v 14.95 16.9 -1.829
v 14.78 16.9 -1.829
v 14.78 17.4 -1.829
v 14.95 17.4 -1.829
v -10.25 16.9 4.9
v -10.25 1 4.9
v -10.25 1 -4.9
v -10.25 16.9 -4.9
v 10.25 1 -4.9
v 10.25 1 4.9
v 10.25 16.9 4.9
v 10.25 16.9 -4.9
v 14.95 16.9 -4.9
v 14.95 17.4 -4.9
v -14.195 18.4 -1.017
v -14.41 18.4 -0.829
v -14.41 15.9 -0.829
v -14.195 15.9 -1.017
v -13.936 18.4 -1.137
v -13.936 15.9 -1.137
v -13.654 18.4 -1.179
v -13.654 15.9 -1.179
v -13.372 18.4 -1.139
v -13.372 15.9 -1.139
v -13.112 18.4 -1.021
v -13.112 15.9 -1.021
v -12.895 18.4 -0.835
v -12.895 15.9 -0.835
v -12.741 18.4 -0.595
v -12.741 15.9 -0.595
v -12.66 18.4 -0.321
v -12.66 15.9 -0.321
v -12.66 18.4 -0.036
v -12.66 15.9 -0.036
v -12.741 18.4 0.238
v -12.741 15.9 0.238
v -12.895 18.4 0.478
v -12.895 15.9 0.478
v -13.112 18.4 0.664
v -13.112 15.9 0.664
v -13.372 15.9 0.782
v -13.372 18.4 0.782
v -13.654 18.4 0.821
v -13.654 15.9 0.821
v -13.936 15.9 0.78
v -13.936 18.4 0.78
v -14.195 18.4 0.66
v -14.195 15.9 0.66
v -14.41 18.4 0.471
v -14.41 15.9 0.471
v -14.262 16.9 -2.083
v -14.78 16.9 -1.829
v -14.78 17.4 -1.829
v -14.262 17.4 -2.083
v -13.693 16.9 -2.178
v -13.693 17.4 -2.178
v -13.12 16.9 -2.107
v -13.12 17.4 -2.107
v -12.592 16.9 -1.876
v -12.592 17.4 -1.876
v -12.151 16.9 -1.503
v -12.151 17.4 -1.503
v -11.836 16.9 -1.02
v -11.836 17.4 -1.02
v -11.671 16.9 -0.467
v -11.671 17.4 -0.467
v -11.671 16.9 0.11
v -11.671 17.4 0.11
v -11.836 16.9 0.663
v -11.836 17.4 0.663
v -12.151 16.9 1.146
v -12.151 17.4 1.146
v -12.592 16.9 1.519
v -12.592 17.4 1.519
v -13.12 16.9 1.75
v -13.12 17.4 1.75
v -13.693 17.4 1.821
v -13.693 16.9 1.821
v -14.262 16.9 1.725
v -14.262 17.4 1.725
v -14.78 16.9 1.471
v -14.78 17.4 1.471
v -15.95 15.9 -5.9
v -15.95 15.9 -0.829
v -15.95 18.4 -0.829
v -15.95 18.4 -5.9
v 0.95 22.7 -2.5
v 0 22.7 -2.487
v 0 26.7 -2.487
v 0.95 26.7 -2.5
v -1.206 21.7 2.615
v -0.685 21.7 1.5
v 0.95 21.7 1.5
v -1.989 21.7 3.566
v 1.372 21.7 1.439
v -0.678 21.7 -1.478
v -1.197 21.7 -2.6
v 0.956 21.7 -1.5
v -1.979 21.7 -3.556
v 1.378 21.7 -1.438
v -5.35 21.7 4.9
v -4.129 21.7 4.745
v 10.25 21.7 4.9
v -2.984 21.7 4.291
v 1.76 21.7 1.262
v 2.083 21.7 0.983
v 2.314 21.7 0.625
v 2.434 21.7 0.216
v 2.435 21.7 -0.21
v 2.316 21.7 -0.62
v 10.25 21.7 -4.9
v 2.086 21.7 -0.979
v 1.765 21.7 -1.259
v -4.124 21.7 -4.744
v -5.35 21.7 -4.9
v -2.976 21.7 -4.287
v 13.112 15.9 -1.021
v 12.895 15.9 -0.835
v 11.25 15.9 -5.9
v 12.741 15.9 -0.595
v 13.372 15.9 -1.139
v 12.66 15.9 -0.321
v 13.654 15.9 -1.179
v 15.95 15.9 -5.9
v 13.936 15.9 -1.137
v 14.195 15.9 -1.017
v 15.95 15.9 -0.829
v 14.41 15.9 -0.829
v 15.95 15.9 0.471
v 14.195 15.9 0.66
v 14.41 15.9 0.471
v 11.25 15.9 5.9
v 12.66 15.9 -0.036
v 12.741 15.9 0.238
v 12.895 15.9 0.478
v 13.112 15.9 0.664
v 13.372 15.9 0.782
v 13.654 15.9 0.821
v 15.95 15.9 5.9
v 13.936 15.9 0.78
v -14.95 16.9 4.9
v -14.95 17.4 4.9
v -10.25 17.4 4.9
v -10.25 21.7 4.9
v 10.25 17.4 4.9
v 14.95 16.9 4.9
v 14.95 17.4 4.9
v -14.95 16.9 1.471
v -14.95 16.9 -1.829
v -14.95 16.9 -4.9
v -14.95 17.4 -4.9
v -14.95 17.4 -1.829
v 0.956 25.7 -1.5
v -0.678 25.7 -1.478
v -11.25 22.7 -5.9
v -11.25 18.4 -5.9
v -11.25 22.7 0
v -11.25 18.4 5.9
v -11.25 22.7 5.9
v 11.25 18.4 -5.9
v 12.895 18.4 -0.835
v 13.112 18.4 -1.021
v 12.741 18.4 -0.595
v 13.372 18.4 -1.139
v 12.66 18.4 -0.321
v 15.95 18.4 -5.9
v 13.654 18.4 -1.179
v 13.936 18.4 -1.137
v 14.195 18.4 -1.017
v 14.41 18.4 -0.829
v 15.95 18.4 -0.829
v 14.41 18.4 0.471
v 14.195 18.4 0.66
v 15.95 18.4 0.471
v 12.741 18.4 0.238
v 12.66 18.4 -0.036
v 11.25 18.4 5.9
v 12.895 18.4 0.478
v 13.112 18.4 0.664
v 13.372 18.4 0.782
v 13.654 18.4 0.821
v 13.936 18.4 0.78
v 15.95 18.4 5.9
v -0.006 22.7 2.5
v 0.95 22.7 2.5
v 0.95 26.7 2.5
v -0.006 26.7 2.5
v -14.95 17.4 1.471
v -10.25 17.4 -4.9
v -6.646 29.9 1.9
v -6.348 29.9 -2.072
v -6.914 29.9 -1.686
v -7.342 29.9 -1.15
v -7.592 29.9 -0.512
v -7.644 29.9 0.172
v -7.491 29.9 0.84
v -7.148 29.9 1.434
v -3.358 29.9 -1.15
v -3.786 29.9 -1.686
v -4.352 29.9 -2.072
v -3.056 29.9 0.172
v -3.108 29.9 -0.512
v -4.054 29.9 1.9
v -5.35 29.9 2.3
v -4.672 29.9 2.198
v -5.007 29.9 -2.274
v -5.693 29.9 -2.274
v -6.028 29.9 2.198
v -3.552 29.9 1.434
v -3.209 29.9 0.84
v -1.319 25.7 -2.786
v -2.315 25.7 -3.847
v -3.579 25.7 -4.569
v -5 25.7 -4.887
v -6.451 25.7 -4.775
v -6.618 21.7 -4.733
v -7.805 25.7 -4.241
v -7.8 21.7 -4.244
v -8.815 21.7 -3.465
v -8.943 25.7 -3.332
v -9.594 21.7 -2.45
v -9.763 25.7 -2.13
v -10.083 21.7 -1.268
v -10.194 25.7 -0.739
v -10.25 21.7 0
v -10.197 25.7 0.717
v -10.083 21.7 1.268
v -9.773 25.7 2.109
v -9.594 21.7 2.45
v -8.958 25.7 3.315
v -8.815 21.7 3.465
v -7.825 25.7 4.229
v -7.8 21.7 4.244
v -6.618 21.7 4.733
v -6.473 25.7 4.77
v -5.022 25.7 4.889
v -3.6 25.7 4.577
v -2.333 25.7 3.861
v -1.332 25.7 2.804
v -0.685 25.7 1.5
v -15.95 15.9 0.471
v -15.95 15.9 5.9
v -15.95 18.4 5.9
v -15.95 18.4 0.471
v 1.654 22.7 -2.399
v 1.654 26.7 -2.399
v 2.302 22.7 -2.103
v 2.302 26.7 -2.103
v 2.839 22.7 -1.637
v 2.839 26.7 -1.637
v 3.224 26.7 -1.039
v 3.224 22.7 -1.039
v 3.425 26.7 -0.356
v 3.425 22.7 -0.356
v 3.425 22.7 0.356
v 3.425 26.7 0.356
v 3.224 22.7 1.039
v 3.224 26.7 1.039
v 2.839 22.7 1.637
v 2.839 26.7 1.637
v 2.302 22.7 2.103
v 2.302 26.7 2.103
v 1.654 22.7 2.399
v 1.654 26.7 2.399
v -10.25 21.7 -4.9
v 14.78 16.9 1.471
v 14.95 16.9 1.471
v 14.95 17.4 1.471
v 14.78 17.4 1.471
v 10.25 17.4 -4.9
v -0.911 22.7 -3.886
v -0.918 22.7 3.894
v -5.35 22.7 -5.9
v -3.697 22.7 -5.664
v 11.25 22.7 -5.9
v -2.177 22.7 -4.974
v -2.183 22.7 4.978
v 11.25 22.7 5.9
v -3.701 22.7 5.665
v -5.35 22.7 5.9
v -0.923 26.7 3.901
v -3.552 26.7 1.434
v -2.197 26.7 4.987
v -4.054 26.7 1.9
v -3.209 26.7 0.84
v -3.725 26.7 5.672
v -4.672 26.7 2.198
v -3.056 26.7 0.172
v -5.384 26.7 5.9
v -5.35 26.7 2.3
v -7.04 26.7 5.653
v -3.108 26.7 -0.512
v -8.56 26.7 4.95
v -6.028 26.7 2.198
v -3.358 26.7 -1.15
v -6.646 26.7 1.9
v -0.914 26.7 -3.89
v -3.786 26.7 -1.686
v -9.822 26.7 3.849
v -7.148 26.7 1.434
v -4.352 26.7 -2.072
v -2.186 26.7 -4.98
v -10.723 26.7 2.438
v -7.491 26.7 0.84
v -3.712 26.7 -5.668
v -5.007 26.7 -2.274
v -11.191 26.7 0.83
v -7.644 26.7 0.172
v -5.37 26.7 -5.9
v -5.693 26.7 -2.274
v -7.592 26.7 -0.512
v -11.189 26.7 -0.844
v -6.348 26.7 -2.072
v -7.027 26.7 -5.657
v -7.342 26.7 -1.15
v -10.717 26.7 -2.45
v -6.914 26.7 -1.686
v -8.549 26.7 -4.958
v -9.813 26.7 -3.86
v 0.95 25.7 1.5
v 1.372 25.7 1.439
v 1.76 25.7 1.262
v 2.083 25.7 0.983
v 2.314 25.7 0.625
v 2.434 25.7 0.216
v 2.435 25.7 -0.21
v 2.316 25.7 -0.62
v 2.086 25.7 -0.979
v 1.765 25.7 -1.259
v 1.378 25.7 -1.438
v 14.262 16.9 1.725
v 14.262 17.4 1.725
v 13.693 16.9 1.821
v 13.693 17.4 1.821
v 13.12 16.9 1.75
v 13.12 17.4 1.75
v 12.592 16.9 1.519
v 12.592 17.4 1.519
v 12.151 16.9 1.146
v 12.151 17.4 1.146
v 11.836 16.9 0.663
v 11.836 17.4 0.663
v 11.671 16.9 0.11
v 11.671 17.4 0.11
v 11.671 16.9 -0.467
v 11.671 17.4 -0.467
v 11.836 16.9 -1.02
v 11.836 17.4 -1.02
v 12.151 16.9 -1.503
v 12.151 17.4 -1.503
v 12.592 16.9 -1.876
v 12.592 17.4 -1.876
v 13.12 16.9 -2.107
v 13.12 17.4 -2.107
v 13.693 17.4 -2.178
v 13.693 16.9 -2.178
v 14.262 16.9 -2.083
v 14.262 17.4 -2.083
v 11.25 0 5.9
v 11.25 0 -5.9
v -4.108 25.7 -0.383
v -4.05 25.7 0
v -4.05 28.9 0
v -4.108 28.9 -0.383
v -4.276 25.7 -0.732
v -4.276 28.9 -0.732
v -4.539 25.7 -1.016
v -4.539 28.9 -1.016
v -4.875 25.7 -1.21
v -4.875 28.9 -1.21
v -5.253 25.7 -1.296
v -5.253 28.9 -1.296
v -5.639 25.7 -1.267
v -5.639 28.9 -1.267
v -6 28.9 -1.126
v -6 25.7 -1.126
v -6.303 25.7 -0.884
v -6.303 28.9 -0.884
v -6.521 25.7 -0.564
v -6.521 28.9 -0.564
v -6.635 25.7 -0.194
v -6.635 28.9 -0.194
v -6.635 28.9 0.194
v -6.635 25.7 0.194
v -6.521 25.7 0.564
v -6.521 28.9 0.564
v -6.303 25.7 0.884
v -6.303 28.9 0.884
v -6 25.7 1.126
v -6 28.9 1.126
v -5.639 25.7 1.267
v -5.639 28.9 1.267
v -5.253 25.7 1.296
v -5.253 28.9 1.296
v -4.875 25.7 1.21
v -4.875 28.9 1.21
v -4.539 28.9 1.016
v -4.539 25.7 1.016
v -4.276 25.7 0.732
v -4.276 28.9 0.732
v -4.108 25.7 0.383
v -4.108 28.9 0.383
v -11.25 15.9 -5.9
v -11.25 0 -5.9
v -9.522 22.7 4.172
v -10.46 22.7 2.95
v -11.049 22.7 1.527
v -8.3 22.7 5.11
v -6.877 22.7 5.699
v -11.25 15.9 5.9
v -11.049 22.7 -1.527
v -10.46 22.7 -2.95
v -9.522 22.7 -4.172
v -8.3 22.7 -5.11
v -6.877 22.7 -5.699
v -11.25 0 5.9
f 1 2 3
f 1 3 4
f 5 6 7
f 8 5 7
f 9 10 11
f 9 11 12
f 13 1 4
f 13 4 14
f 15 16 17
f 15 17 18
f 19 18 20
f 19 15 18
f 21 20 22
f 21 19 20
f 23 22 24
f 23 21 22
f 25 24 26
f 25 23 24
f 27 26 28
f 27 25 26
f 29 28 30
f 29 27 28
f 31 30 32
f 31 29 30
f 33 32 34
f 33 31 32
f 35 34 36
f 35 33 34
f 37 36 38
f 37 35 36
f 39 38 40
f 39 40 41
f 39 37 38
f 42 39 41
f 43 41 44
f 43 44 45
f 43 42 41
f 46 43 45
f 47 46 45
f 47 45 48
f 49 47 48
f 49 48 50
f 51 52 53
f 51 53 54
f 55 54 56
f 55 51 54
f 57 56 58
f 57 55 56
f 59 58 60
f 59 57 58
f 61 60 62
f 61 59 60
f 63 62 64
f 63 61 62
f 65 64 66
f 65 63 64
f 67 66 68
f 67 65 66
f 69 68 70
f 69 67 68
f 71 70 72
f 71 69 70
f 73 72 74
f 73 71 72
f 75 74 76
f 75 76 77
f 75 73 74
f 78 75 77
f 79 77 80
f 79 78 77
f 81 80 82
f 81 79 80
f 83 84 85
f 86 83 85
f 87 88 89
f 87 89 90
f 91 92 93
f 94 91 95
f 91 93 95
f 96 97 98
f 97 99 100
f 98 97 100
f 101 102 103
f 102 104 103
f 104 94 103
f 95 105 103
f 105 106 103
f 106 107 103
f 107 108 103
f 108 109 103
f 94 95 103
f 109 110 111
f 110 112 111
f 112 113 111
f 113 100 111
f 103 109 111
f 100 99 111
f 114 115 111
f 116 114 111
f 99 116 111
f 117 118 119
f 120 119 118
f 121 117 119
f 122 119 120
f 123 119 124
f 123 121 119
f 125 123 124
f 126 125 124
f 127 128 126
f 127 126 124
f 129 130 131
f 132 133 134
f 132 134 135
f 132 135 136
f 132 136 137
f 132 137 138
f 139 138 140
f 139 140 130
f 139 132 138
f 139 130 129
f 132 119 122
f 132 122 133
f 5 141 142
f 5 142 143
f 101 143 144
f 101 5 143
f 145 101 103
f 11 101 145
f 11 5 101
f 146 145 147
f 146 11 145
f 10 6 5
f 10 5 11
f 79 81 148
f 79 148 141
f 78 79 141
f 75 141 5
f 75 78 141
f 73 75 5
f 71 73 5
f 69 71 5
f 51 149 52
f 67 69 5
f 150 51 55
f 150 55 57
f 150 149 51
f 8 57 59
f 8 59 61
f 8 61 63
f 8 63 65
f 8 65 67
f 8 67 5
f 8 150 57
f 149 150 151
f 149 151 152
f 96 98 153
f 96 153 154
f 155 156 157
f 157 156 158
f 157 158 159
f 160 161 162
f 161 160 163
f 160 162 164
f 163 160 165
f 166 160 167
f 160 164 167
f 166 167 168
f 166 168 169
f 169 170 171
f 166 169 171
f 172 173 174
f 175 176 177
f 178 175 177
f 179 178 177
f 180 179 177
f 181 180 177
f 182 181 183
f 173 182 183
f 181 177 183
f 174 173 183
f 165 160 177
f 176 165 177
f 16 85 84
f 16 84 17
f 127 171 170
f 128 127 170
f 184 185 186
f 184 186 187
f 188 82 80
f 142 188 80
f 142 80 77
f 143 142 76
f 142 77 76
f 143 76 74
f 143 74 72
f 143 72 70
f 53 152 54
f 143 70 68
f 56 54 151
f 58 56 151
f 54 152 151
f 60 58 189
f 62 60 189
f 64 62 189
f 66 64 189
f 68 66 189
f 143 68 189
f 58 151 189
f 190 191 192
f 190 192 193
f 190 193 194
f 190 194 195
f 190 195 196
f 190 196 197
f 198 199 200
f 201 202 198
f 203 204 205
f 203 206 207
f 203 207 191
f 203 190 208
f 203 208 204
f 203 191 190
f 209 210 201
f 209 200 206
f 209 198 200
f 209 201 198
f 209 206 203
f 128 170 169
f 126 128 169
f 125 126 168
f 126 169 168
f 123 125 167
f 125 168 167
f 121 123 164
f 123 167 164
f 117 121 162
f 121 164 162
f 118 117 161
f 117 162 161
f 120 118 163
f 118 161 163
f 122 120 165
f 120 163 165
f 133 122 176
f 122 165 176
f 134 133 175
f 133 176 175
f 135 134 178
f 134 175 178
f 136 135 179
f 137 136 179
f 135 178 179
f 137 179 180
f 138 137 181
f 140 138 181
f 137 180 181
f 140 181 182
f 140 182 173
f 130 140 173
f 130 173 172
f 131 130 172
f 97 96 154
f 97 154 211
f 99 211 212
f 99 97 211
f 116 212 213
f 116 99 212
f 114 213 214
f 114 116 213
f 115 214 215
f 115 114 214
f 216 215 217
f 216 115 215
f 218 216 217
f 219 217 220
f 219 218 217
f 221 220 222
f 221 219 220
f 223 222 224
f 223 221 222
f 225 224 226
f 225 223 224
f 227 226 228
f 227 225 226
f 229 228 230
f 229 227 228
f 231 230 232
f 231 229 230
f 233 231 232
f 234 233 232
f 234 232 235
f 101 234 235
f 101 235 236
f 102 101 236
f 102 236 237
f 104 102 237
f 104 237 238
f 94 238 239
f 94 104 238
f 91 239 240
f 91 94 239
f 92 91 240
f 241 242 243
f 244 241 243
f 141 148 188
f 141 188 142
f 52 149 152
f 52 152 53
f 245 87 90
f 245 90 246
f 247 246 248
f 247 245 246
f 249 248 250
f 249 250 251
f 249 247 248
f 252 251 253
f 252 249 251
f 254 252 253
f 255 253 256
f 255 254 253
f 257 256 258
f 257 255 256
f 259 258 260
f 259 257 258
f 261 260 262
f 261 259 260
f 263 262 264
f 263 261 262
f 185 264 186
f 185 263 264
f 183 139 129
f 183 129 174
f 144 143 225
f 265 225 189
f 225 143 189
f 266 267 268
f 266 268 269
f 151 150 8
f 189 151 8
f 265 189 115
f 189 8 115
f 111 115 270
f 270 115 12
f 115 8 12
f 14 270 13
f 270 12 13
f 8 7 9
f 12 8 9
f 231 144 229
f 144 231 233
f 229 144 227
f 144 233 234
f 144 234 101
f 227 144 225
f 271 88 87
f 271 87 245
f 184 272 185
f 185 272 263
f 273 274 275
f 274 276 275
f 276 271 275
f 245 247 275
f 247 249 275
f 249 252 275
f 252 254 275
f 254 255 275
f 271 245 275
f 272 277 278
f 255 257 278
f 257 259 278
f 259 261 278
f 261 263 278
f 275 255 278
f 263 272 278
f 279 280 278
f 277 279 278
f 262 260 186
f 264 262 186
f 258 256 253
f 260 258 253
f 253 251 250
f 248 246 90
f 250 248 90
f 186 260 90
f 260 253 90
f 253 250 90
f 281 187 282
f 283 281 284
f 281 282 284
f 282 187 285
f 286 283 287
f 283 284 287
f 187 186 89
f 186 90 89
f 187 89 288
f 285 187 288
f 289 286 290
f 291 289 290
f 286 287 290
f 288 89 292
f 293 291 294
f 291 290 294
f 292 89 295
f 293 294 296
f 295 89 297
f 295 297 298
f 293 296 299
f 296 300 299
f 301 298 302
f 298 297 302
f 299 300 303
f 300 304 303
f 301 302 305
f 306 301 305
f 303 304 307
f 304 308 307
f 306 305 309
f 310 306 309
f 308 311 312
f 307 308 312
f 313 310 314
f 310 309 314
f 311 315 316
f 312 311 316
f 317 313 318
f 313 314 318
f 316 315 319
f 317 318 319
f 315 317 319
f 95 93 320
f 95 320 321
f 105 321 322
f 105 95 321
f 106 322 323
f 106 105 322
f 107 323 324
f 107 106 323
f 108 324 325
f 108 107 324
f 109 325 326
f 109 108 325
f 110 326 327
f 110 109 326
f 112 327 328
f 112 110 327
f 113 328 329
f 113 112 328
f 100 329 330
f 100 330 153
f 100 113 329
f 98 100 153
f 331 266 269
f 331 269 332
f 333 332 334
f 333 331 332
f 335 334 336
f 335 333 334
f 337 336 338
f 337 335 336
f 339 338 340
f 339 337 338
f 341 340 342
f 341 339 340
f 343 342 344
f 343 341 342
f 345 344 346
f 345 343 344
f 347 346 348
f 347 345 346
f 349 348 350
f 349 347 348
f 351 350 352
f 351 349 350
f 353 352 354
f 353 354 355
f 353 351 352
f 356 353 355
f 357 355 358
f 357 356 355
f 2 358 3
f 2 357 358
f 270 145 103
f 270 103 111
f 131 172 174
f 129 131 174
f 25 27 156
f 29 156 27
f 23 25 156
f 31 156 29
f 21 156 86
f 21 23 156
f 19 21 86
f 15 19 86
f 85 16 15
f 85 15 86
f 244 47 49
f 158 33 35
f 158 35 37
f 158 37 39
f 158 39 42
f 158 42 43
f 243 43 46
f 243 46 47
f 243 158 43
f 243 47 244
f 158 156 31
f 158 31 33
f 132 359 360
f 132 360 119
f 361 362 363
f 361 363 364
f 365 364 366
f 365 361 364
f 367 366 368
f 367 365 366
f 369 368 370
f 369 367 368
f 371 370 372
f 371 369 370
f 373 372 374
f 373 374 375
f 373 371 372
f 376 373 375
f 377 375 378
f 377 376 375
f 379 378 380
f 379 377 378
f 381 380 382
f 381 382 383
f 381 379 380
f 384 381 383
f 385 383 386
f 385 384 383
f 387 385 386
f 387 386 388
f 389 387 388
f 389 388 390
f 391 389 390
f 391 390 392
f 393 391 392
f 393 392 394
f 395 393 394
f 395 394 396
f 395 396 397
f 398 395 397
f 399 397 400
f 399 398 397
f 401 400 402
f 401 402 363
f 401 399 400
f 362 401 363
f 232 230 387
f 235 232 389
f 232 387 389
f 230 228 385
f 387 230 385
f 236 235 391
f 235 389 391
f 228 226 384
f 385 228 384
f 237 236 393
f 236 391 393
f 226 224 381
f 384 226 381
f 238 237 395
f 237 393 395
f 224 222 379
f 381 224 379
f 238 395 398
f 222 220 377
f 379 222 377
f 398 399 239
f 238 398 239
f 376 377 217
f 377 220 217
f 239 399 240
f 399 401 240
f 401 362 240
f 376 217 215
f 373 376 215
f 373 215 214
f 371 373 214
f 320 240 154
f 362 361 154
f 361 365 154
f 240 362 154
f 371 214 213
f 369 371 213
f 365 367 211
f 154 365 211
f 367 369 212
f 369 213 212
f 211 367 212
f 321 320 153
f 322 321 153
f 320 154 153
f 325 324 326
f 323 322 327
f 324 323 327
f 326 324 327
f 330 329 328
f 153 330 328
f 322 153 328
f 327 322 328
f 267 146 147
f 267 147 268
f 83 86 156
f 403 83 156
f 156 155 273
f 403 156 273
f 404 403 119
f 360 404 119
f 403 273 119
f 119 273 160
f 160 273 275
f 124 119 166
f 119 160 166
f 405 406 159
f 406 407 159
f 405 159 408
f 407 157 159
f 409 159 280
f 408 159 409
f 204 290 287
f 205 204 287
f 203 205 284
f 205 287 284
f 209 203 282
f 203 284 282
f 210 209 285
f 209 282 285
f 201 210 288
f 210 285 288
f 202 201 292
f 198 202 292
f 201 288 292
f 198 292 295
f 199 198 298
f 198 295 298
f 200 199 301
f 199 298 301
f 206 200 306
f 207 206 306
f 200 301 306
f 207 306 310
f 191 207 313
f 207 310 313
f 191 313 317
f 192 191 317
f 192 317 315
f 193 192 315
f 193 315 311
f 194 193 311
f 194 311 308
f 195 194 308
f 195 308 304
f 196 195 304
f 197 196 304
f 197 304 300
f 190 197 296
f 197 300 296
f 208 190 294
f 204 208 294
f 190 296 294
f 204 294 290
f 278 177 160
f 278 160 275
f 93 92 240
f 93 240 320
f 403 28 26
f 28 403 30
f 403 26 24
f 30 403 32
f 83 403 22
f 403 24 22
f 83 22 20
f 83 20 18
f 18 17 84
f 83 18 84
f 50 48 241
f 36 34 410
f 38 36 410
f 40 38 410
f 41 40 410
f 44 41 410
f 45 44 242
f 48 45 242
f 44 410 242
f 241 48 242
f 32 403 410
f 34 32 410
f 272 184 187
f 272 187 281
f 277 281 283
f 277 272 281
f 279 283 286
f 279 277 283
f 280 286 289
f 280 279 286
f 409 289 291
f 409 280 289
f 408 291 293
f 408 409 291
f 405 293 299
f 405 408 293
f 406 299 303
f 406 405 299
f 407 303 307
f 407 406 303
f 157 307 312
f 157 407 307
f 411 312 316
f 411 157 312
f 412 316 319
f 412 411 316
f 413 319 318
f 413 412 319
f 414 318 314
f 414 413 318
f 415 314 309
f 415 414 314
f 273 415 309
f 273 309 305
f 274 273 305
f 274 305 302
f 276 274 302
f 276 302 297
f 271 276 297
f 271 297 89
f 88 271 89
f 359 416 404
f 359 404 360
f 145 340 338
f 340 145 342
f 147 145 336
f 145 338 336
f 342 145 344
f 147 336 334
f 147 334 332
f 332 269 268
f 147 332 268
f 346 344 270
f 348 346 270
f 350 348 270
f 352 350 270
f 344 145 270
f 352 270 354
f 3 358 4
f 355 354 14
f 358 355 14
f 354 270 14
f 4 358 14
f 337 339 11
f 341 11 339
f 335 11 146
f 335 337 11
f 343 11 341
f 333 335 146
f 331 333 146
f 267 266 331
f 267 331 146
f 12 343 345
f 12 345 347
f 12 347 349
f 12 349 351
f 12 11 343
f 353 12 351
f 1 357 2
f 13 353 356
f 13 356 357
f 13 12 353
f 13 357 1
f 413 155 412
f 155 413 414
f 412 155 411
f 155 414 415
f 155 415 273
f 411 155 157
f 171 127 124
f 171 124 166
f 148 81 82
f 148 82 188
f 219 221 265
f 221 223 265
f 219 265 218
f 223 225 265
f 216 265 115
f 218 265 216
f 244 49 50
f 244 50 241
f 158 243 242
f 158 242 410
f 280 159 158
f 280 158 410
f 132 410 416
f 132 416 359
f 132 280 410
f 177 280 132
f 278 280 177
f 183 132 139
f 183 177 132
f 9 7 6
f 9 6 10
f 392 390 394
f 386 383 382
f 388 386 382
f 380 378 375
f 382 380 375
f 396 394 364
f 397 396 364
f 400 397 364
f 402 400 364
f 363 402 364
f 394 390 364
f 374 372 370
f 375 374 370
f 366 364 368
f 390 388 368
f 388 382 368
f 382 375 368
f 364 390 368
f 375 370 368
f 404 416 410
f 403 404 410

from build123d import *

# Parameters (mm, degrees)
SKETCH1_W           = 22.5
SKETCH1_H           = 22.7
BOSS_EXTRUDE1_DEPTH = 5.9
SKETCH2_W           = 4.7
SKETCH2_H           = 2.5
BOSS_EXTRUDE2_DEPTH = 11.8
CUT_EXTRUDE1_REACH  = 27.055
BOSS_EXTRUDE3_DEPTH = 4
SKETCH5_R           = 2.3
BOSS_EXTRUDE4_DEPTH = 3.2
SHELL3_START        = 1
SHELL3_OUTLINE_W    = 20.5
SHELL3_OUTLINE_H    = 9.8
SHELL3_DEPTH        = 20.7
SHELL3_START_2      = 21.7
SHELL3_2_DEPTH      = 4
SHELL3_START_3      = 16.9
SHELL3_3_DEPTH      = 0.5
SHELL3_START_4      = 25.7
SHELL3_4_OUTLINE_R  = 1.3
SHELL3_4_DEPTH      = 3.2


# Read off the part's stored shape, not the designer's step: Shell3
with BuildPart() as part:
    # Sketch1 → Boss-Extrude1 (new, symmetric)
    with BuildSketch(Plane.XY):
        with Locations((0, 11.35)):
            Rectangle(SKETCH1_W, SKETCH1_H)
    extrude(amount=BOSS_EXTRUDE1_DEPTH, both=True)

    # Sketch2 → Boss-Extrude2 (add)
    with BuildSketch(Plane.XY.offset(5.9)):
        with Locations((13.6, 17.15)):
            Rectangle(SKETCH2_W, SKETCH2_H)
    boss_extrude2 = extrude(amount=-BOSS_EXTRUDE2_DEPTH)

    # Sketch3 → Cut-Extrude1 (cut, up to next)
    with BuildSketch(Plane(origin=(0, 18.4, 0), x_dir=(1, 0, 0), z_dir=(0, 1, 0)), mode=Mode.PRIVATE) as cut_extrude1_sk1:
        with BuildLine():
            Line((15.95, 0.828555983), (14.409934208, 0.828555983))
            ThreePointArc((14.409934208, 0.828555983), (12.65, 0.178555983), (14.409934208, -0.471444017))
            Line((14.409934208, -0.471444017), (15.95, -0.471444017))
            Line((15.95, -0.471444017), (15.95, 0.828555983))
        make_face()
    cut_extrude1_tool1 = extrude(cut_extrude1_sk1.sketch, amount=-CUT_EXTRUDE1_REACH, mode=Mode.PRIVATE) & part.part
    cut_extrude1 = cut_extrude1_tool1.solids().sort_by_distance((14.234181, 18.4, -0.178556))[0]
    add(cut_extrude1, mode=Mode.SUBTRACT)

    # Mirror1: Boss-Extrude2, Cut-Extrude1 across plane
    add(boss_extrude2.mirror(Plane(origin=(0, 0, 0), x_dir=(0, 0, 1), z_dir=(1, 0, 0))))
    add(cut_extrude1.mirror(Plane(origin=(0, 0, 0), x_dir=(0, 0, 1), z_dir=(1, 0, 0))), mode=Mode.SUBTRACT)

    # Sketch4 → Boss-Extrude3 (add)
    with BuildSketch(Plane(origin=(0, 22.7, 0), x_dir=(1, 0, 0), z_dir=(0, 1, 0))):
        with BuildLine():
            Line((0, 2.487468593), (0.95, 2.5))
            ThreePointArc((0.95, 2.5), (3.45, 0), (0.95, -2.5))
            Line((0.95, -2.5), (-0.005844314, -2.5))
            ThreePointArc((-0.005844314, -2.5), (-11.249995949, 0.006913613), (0, 2.487468593))
        make_face()
    extrude(amount=BOSS_EXTRUDE3_DEPTH)

    # Sketch5 → Boss-Extrude4 (add)
    with BuildSketch(Plane(origin=(0, 26.7, 0), x_dir=(1, 0, 0), z_dir=(0, 1, 0))):
        with Locations(Location((-5.35, 0, 0), (0, 0, 270))):
            Circle(SKETCH5_R)
    extrude(amount=BOSS_EXTRUDE4_DEPTH)

    # Shell3 outline → Shell3 (cut)
    with BuildSketch(Plane(origin=(0, 0, 0), x_dir=(1, 0, 0), z_dir=(0, 1, 0)).offset(SHELL3_START)):
        Rectangle(SHELL3_OUTLINE_W, SHELL3_OUTLINE_H)
    extrude(amount=SHELL3_DEPTH, mode=Mode.SUBTRACT)

    # Shell3 2 outline → Shell3 2 (cut)
    with BuildSketch(Plane(origin=(0, 0, 0), x_dir=(1, 0, 0), z_dir=(0, 1, 0)).offset(SHELL3_START_2)):
        with BuildLine():
            Line((-0.685238484, -1.5), (0.95, -1.5))
            ThreePointArc((0.95, -1.5), (2.449997238, -0.002878764), (0.955757517, 1.49998895))
            Line((0.955757517, 1.49998895), (-0.67835846, 1.4784334))
            ThreePointArc((-0.67835846, 1.4784334), (-10.249986927, 0.01131871), (-0.685238484, -1.5))
        make_face()
    extrude(amount=SHELL3_2_DEPTH, mode=Mode.SUBTRACT)

    # Shell3 3 outline → Shell3 3 (cut)
    with BuildSketch(Plane(origin=(0, 0, 0), x_dir=(1, 0, 0), z_dir=(0, 1, 0)).offset(SHELL3_START_3)):
        with BuildLine():
            Line((-14.95, 4.9), (-14.95, 1.828555983))
            Line((-14.95, 1.828555983), (-14.780265456, 1.828555983))
            ThreePointArc((-14.780265456, 1.828555983), (-11.65, 0.178555983), (-14.780265456, -1.471444017))
            Line((-14.780265456, -1.471444017), (-14.95, -1.471444017))
            Line((-14.95, -1.471444017), (-14.95, -4.9))
            Line((-14.95, -4.9), (-10.25, -4.9))
            Line((-10.25, -4.9), (-10.25, 4.9))
            Line((-10.25, 4.9), (-14.95, 4.9))
        make_face()
        with BuildLine():
            Line((14.95, 4.9), (10.25, 4.9))
            Line((10.25, 4.9), (10.25, -4.9))
            Line((10.25, -4.9), (14.95, -4.9))
            Line((14.95, -4.9), (14.95, -1.471444017))
            Line((14.95, -1.471444017), (14.780265456, -1.471444017))
            ThreePointArc((14.780265456, -1.471444017), (11.65, 0.178555983), (14.780265456, 1.828555983))
            Line((14.780265456, 1.828555983), (14.95, 1.828555983))
            Line((14.95, 1.828555983), (14.95, 4.9))
        make_face()
    extrude(amount=SHELL3_3_DEPTH, mode=Mode.SUBTRACT)

    # Shell3 4 outline → Shell3 4 (cut)
    with BuildSketch(Plane(origin=(0, 0, 0), x_dir=(1, 0, 0), z_dir=(0, 1, 0)).offset(SHELL3_START_4)):
        with Locations((-5.35, 0)):
            Circle(SHELL3_4_OUTLINE_R)
    extrude(amount=SHELL3_4_DEPTH, mode=Mode.SUBTRACT)


solid = part.part
